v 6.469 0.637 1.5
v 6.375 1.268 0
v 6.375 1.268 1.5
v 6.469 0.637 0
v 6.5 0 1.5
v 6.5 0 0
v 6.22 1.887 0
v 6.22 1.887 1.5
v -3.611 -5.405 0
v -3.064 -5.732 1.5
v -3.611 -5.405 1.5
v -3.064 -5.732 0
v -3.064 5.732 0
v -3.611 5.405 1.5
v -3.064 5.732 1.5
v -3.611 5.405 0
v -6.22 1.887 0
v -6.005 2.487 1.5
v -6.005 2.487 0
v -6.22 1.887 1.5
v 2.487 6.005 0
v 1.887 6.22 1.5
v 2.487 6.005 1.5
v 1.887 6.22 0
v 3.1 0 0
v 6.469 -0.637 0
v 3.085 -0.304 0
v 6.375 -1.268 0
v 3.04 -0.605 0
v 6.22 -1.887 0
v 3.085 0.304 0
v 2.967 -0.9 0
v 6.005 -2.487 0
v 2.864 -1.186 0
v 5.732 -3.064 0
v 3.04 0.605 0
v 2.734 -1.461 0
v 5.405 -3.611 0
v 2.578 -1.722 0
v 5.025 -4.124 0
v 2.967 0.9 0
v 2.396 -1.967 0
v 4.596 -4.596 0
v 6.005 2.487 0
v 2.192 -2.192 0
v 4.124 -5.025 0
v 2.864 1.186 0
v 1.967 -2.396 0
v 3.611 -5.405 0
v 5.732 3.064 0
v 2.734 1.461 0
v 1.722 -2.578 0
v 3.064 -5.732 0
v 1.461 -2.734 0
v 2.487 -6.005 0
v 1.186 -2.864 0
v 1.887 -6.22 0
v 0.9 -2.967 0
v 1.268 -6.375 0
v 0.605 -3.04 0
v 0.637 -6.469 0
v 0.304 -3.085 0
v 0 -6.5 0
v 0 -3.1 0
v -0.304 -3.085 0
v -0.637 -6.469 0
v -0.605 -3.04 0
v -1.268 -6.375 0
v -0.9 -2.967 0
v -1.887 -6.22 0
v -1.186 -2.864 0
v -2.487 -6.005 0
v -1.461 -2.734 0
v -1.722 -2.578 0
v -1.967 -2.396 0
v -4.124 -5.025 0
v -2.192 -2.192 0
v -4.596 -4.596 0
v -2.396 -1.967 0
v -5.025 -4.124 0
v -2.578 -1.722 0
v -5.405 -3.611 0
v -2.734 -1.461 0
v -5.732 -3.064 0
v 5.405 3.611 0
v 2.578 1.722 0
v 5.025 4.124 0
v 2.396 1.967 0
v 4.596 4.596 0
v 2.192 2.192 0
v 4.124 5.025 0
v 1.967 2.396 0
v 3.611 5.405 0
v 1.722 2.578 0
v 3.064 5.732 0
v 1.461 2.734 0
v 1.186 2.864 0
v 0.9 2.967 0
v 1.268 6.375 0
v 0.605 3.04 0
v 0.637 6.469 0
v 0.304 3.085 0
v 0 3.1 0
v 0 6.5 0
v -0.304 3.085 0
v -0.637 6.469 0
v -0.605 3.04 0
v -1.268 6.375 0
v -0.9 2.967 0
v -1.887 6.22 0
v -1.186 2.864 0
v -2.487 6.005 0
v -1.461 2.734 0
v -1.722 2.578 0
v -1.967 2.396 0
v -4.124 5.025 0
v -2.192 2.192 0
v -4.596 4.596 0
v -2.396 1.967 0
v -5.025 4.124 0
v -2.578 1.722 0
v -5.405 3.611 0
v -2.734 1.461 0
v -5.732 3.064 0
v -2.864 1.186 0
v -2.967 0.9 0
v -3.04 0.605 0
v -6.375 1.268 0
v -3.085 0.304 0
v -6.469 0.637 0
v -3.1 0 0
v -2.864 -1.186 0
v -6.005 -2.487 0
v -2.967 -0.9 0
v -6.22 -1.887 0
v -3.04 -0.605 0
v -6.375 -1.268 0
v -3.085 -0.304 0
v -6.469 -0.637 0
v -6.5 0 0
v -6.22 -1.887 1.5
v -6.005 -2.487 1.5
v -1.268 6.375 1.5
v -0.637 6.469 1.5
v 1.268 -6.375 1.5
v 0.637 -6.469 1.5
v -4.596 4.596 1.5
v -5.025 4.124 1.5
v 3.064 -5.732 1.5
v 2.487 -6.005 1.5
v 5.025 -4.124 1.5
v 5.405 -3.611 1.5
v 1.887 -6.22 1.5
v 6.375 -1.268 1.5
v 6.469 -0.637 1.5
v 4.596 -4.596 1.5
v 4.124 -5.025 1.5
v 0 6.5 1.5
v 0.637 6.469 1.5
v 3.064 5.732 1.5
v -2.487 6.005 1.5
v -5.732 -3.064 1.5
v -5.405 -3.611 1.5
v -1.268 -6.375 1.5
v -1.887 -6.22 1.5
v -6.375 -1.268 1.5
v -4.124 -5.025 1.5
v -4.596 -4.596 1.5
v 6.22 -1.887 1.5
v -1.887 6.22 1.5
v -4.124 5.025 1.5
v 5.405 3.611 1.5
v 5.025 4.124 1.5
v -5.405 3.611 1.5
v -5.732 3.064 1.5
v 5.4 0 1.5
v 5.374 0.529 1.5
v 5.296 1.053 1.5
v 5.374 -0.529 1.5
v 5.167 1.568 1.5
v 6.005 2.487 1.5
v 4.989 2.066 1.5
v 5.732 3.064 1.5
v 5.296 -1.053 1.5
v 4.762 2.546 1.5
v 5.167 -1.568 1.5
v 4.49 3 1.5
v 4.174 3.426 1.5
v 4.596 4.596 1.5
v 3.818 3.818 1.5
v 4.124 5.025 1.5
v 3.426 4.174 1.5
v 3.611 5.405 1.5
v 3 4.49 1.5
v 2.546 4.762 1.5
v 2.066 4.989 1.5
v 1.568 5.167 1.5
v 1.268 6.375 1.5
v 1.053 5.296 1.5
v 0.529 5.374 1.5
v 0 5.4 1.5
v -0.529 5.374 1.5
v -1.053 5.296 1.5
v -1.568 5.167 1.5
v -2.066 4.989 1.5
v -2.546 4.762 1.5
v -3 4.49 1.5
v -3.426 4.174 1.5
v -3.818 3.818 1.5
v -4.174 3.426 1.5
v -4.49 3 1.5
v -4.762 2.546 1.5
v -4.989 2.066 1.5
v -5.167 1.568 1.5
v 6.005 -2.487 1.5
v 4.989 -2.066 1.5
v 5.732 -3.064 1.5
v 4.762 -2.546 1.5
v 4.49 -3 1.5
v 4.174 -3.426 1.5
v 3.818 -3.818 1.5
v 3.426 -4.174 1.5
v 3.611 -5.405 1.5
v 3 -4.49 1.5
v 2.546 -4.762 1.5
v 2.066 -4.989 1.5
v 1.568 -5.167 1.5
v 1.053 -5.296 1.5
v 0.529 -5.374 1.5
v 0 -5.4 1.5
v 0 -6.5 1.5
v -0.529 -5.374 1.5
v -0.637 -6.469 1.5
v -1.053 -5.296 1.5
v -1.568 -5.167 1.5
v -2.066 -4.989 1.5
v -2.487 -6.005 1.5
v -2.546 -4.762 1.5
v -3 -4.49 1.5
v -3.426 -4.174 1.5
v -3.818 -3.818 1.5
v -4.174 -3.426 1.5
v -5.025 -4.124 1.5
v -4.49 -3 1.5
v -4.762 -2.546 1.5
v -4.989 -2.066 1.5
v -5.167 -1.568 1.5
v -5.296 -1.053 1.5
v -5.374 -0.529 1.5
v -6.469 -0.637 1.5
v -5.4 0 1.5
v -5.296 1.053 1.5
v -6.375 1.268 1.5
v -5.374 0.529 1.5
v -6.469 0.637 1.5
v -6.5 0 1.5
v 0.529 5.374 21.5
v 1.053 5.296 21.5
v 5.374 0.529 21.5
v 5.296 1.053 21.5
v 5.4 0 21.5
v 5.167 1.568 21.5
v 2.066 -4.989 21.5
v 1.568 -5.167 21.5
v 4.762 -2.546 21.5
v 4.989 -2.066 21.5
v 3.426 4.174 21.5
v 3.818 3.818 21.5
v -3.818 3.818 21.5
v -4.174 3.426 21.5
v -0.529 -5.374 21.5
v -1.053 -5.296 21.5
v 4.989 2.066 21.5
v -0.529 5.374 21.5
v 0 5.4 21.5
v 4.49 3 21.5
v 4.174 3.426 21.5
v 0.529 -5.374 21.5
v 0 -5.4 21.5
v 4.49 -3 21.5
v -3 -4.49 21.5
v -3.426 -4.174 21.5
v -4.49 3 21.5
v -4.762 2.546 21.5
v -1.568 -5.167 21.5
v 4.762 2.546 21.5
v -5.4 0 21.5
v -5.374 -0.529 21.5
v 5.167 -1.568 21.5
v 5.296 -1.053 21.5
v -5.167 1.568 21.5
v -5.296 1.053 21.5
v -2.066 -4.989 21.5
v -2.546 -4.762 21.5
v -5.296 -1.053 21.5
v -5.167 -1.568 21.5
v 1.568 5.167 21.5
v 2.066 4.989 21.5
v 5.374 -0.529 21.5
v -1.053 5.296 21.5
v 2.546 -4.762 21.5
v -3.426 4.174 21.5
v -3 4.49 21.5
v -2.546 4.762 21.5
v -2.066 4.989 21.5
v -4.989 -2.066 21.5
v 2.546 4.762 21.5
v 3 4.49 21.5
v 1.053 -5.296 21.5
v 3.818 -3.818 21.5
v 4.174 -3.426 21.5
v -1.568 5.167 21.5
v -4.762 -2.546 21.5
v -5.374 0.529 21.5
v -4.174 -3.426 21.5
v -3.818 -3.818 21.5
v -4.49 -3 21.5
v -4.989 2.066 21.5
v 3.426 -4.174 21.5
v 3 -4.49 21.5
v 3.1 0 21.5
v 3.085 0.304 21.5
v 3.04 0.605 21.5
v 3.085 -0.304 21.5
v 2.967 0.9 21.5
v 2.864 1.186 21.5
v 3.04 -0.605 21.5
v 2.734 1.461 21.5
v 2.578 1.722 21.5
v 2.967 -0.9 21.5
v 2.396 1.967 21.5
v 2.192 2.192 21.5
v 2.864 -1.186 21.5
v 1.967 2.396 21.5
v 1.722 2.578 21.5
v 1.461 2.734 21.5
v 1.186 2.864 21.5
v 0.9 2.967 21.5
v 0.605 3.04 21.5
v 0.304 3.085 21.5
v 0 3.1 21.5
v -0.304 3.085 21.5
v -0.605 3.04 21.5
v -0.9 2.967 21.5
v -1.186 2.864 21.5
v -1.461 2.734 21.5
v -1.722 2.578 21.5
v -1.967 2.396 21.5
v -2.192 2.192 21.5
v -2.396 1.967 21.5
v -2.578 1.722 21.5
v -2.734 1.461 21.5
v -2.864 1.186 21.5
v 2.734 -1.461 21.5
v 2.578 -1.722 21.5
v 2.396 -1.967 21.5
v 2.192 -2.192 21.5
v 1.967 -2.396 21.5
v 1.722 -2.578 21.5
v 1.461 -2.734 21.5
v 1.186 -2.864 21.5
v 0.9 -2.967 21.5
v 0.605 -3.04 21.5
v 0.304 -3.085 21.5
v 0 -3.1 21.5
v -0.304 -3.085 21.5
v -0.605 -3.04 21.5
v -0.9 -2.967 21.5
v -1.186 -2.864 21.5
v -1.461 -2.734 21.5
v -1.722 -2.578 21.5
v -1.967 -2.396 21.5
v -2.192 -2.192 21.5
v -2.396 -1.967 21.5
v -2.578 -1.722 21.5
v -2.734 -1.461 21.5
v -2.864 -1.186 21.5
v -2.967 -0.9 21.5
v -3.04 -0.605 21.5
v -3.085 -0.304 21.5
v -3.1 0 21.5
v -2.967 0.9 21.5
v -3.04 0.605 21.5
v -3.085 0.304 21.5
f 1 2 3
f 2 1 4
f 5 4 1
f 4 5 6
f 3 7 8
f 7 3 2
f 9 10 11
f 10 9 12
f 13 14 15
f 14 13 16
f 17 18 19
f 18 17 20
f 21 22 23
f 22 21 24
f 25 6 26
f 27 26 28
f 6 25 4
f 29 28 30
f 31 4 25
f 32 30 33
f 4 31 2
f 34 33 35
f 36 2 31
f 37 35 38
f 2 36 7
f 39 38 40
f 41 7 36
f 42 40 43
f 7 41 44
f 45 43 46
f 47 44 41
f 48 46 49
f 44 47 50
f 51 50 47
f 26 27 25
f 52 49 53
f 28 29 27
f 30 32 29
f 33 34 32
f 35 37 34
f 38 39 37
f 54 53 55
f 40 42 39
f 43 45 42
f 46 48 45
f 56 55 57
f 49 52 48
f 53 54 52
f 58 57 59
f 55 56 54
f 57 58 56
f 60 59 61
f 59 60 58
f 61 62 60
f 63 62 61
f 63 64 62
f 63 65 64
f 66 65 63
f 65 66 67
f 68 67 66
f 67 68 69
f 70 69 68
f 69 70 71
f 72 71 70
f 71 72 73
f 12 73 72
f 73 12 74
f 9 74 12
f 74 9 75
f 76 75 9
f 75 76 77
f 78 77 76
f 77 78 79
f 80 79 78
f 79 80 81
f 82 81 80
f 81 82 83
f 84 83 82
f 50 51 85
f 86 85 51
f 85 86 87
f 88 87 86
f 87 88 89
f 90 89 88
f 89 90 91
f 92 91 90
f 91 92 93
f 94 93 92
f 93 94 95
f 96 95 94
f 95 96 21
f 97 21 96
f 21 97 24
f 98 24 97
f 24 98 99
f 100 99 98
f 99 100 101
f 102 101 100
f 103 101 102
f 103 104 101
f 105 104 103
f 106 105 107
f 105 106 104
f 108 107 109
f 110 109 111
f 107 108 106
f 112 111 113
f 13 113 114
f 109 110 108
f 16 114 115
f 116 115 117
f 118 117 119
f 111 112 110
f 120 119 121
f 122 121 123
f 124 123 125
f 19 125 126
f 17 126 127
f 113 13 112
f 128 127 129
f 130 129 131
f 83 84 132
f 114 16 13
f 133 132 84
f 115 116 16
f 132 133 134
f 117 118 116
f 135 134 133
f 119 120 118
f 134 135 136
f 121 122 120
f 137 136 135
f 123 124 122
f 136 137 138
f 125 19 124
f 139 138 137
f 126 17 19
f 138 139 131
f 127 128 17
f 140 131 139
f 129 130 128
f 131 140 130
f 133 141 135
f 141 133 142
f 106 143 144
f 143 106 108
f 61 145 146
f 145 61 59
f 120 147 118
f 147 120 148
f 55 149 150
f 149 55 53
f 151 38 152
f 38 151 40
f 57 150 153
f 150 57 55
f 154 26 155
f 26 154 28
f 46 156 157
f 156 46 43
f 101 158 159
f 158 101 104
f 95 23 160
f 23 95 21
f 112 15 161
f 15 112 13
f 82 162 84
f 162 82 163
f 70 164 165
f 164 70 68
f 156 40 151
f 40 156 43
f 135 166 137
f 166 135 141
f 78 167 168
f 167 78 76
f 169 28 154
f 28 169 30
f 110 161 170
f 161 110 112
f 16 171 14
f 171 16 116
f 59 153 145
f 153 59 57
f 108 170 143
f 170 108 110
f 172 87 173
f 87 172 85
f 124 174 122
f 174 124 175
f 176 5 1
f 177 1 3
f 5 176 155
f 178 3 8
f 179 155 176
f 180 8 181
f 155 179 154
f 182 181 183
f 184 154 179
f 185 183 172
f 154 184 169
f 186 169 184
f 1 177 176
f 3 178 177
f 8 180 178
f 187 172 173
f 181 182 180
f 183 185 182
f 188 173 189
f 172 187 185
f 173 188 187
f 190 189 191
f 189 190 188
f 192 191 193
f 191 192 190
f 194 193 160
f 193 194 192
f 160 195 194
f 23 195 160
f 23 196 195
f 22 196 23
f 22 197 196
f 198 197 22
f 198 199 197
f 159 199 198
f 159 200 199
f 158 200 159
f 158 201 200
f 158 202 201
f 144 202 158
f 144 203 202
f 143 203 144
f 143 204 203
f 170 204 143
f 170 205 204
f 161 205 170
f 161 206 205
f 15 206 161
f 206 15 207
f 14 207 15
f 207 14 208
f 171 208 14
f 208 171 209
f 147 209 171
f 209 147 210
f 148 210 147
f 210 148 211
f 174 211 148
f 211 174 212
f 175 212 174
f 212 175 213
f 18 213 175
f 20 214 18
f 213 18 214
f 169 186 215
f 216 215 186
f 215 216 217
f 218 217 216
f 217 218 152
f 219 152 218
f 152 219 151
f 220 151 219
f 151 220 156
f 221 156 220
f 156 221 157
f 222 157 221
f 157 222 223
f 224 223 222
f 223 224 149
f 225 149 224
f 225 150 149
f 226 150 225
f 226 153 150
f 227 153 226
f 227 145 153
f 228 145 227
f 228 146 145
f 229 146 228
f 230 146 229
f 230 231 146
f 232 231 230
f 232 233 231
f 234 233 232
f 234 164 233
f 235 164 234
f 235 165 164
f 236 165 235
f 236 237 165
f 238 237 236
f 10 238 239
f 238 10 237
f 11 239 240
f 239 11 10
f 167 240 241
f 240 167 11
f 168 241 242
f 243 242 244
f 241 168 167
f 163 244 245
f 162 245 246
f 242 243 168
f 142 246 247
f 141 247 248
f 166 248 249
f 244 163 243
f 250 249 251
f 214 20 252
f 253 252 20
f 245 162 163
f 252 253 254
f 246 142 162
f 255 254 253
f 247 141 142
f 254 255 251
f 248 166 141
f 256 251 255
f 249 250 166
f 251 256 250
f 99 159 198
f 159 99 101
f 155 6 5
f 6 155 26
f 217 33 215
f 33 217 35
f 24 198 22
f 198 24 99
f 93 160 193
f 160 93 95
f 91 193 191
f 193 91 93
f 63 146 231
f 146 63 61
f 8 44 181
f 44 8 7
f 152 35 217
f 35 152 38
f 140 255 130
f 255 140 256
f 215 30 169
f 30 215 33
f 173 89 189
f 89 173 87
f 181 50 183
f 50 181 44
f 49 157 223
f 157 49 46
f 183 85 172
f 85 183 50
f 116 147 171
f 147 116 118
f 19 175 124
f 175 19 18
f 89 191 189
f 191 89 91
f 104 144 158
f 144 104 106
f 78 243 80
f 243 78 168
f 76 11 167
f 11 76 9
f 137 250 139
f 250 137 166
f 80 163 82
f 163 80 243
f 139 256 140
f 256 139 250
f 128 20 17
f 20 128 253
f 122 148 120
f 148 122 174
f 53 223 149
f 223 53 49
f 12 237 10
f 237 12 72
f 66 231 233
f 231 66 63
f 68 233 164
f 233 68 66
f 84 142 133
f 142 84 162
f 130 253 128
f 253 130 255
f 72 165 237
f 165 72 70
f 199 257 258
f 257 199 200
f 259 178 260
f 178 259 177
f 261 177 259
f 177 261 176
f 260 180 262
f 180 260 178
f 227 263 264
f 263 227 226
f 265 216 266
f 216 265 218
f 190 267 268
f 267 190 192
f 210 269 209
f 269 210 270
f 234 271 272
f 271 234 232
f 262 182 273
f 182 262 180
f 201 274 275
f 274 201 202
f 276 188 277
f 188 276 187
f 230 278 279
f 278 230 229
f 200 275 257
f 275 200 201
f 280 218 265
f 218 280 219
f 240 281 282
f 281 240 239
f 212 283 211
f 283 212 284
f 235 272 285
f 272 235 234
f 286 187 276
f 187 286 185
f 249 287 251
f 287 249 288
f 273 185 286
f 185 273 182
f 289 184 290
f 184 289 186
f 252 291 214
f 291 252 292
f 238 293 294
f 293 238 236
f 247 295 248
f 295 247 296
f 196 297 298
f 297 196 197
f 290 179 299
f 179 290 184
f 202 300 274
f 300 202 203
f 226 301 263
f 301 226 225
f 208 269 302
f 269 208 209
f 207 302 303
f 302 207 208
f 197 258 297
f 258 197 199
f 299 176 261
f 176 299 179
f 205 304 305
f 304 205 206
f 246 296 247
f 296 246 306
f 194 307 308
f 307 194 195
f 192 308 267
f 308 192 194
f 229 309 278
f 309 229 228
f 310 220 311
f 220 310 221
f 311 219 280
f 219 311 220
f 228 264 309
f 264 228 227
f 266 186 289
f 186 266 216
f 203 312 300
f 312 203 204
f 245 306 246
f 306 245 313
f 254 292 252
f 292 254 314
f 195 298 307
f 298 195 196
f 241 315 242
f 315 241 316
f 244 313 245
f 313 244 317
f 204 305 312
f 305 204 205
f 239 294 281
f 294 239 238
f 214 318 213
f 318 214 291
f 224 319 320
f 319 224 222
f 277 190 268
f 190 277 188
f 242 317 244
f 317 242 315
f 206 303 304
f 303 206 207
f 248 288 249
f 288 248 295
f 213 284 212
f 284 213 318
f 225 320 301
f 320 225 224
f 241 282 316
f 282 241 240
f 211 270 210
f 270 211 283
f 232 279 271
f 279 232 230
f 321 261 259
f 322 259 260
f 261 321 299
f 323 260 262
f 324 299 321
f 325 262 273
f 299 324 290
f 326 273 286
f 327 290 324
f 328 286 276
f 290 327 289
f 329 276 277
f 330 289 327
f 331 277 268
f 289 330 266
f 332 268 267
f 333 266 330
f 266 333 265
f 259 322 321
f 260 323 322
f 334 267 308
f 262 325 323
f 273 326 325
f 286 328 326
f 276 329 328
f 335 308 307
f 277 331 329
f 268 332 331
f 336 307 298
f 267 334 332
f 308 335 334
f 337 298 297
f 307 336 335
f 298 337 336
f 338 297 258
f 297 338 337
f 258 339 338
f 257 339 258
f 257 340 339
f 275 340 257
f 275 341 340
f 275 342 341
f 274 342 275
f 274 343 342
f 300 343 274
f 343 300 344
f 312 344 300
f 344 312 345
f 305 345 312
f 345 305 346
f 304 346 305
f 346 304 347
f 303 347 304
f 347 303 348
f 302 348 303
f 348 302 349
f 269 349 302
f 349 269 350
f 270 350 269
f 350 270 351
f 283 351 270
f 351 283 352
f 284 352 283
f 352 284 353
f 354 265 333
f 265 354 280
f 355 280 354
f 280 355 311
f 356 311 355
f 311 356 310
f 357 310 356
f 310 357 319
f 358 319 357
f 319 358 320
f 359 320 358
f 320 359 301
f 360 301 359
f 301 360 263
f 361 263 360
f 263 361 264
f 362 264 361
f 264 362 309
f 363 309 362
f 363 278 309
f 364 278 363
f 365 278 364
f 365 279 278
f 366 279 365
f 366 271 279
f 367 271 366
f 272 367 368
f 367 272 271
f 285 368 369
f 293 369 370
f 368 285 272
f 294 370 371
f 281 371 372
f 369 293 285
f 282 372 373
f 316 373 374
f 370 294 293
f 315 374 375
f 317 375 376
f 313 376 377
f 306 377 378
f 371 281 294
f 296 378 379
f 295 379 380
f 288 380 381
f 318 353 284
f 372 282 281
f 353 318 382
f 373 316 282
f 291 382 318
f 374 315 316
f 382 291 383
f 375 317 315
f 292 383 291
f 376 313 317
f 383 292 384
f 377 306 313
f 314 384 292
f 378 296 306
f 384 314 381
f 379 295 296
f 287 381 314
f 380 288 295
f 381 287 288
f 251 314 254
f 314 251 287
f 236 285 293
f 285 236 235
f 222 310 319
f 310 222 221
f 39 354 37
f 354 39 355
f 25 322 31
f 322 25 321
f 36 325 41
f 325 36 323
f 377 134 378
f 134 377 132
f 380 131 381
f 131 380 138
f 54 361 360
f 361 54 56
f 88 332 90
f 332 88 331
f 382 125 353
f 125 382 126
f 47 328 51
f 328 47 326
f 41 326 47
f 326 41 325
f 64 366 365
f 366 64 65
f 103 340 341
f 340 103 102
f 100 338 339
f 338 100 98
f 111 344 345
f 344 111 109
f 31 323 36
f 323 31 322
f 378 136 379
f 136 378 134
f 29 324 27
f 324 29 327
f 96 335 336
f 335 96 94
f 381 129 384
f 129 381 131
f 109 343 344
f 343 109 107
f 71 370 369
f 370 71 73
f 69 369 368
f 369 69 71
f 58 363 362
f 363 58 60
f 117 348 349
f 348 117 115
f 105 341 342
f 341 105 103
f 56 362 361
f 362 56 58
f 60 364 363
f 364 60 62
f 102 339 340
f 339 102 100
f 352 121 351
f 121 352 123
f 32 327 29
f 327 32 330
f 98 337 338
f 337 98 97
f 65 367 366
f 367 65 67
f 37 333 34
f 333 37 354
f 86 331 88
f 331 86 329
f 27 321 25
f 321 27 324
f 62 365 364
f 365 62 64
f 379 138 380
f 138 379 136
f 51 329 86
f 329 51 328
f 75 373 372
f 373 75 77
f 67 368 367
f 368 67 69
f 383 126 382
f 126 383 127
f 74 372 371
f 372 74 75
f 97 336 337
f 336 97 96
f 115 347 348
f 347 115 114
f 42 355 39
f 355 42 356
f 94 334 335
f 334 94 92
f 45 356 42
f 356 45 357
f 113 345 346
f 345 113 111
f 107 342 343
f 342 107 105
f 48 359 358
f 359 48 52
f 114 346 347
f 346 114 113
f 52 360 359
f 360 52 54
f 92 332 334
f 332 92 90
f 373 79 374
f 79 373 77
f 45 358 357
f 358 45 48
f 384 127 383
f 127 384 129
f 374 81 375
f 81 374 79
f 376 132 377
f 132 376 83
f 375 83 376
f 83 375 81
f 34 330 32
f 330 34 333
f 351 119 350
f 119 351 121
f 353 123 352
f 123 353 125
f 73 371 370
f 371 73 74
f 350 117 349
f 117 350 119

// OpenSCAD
// Adapter sleeve: 0.2 mL PCR tube in a 1.5 mL tube rack hole
// Print orientation: collar on the bed (z = 0), sleeve body upward.

$fn = 64;

// ---- Dimensions (mm) ----
collar_d      = 13;    // collar outer diameter
collar_h      = 1.5;   // collar thickness (z = 0 to 1.5)
sleeve_od     = 10.8;  // sleeve body outer diameter
sleeve_top_z  = 21.5;  // top of sleeve body (z)
bore_d        = 6.2;   // through-bore diameter
eps           = 0.5;   // cutter overshoot past faces

// ---- Model ----
difference() {
    union() {
        // Collar
        cylinder(d = collar_d, h = collar_h);
        // Sleeve body (slightly overlaps collar for a clean union)
        translate([0, 0, collar_h - 0.01])
            cylinder(d = sleeve_od, h = sleeve_top_z - collar_h + 0.01);
    }
    // Straight through-bore
    translate([0, 0, -eps])
        cylinder(d = bore_d, h = sleeve_top_z + 2 * eps);
}
